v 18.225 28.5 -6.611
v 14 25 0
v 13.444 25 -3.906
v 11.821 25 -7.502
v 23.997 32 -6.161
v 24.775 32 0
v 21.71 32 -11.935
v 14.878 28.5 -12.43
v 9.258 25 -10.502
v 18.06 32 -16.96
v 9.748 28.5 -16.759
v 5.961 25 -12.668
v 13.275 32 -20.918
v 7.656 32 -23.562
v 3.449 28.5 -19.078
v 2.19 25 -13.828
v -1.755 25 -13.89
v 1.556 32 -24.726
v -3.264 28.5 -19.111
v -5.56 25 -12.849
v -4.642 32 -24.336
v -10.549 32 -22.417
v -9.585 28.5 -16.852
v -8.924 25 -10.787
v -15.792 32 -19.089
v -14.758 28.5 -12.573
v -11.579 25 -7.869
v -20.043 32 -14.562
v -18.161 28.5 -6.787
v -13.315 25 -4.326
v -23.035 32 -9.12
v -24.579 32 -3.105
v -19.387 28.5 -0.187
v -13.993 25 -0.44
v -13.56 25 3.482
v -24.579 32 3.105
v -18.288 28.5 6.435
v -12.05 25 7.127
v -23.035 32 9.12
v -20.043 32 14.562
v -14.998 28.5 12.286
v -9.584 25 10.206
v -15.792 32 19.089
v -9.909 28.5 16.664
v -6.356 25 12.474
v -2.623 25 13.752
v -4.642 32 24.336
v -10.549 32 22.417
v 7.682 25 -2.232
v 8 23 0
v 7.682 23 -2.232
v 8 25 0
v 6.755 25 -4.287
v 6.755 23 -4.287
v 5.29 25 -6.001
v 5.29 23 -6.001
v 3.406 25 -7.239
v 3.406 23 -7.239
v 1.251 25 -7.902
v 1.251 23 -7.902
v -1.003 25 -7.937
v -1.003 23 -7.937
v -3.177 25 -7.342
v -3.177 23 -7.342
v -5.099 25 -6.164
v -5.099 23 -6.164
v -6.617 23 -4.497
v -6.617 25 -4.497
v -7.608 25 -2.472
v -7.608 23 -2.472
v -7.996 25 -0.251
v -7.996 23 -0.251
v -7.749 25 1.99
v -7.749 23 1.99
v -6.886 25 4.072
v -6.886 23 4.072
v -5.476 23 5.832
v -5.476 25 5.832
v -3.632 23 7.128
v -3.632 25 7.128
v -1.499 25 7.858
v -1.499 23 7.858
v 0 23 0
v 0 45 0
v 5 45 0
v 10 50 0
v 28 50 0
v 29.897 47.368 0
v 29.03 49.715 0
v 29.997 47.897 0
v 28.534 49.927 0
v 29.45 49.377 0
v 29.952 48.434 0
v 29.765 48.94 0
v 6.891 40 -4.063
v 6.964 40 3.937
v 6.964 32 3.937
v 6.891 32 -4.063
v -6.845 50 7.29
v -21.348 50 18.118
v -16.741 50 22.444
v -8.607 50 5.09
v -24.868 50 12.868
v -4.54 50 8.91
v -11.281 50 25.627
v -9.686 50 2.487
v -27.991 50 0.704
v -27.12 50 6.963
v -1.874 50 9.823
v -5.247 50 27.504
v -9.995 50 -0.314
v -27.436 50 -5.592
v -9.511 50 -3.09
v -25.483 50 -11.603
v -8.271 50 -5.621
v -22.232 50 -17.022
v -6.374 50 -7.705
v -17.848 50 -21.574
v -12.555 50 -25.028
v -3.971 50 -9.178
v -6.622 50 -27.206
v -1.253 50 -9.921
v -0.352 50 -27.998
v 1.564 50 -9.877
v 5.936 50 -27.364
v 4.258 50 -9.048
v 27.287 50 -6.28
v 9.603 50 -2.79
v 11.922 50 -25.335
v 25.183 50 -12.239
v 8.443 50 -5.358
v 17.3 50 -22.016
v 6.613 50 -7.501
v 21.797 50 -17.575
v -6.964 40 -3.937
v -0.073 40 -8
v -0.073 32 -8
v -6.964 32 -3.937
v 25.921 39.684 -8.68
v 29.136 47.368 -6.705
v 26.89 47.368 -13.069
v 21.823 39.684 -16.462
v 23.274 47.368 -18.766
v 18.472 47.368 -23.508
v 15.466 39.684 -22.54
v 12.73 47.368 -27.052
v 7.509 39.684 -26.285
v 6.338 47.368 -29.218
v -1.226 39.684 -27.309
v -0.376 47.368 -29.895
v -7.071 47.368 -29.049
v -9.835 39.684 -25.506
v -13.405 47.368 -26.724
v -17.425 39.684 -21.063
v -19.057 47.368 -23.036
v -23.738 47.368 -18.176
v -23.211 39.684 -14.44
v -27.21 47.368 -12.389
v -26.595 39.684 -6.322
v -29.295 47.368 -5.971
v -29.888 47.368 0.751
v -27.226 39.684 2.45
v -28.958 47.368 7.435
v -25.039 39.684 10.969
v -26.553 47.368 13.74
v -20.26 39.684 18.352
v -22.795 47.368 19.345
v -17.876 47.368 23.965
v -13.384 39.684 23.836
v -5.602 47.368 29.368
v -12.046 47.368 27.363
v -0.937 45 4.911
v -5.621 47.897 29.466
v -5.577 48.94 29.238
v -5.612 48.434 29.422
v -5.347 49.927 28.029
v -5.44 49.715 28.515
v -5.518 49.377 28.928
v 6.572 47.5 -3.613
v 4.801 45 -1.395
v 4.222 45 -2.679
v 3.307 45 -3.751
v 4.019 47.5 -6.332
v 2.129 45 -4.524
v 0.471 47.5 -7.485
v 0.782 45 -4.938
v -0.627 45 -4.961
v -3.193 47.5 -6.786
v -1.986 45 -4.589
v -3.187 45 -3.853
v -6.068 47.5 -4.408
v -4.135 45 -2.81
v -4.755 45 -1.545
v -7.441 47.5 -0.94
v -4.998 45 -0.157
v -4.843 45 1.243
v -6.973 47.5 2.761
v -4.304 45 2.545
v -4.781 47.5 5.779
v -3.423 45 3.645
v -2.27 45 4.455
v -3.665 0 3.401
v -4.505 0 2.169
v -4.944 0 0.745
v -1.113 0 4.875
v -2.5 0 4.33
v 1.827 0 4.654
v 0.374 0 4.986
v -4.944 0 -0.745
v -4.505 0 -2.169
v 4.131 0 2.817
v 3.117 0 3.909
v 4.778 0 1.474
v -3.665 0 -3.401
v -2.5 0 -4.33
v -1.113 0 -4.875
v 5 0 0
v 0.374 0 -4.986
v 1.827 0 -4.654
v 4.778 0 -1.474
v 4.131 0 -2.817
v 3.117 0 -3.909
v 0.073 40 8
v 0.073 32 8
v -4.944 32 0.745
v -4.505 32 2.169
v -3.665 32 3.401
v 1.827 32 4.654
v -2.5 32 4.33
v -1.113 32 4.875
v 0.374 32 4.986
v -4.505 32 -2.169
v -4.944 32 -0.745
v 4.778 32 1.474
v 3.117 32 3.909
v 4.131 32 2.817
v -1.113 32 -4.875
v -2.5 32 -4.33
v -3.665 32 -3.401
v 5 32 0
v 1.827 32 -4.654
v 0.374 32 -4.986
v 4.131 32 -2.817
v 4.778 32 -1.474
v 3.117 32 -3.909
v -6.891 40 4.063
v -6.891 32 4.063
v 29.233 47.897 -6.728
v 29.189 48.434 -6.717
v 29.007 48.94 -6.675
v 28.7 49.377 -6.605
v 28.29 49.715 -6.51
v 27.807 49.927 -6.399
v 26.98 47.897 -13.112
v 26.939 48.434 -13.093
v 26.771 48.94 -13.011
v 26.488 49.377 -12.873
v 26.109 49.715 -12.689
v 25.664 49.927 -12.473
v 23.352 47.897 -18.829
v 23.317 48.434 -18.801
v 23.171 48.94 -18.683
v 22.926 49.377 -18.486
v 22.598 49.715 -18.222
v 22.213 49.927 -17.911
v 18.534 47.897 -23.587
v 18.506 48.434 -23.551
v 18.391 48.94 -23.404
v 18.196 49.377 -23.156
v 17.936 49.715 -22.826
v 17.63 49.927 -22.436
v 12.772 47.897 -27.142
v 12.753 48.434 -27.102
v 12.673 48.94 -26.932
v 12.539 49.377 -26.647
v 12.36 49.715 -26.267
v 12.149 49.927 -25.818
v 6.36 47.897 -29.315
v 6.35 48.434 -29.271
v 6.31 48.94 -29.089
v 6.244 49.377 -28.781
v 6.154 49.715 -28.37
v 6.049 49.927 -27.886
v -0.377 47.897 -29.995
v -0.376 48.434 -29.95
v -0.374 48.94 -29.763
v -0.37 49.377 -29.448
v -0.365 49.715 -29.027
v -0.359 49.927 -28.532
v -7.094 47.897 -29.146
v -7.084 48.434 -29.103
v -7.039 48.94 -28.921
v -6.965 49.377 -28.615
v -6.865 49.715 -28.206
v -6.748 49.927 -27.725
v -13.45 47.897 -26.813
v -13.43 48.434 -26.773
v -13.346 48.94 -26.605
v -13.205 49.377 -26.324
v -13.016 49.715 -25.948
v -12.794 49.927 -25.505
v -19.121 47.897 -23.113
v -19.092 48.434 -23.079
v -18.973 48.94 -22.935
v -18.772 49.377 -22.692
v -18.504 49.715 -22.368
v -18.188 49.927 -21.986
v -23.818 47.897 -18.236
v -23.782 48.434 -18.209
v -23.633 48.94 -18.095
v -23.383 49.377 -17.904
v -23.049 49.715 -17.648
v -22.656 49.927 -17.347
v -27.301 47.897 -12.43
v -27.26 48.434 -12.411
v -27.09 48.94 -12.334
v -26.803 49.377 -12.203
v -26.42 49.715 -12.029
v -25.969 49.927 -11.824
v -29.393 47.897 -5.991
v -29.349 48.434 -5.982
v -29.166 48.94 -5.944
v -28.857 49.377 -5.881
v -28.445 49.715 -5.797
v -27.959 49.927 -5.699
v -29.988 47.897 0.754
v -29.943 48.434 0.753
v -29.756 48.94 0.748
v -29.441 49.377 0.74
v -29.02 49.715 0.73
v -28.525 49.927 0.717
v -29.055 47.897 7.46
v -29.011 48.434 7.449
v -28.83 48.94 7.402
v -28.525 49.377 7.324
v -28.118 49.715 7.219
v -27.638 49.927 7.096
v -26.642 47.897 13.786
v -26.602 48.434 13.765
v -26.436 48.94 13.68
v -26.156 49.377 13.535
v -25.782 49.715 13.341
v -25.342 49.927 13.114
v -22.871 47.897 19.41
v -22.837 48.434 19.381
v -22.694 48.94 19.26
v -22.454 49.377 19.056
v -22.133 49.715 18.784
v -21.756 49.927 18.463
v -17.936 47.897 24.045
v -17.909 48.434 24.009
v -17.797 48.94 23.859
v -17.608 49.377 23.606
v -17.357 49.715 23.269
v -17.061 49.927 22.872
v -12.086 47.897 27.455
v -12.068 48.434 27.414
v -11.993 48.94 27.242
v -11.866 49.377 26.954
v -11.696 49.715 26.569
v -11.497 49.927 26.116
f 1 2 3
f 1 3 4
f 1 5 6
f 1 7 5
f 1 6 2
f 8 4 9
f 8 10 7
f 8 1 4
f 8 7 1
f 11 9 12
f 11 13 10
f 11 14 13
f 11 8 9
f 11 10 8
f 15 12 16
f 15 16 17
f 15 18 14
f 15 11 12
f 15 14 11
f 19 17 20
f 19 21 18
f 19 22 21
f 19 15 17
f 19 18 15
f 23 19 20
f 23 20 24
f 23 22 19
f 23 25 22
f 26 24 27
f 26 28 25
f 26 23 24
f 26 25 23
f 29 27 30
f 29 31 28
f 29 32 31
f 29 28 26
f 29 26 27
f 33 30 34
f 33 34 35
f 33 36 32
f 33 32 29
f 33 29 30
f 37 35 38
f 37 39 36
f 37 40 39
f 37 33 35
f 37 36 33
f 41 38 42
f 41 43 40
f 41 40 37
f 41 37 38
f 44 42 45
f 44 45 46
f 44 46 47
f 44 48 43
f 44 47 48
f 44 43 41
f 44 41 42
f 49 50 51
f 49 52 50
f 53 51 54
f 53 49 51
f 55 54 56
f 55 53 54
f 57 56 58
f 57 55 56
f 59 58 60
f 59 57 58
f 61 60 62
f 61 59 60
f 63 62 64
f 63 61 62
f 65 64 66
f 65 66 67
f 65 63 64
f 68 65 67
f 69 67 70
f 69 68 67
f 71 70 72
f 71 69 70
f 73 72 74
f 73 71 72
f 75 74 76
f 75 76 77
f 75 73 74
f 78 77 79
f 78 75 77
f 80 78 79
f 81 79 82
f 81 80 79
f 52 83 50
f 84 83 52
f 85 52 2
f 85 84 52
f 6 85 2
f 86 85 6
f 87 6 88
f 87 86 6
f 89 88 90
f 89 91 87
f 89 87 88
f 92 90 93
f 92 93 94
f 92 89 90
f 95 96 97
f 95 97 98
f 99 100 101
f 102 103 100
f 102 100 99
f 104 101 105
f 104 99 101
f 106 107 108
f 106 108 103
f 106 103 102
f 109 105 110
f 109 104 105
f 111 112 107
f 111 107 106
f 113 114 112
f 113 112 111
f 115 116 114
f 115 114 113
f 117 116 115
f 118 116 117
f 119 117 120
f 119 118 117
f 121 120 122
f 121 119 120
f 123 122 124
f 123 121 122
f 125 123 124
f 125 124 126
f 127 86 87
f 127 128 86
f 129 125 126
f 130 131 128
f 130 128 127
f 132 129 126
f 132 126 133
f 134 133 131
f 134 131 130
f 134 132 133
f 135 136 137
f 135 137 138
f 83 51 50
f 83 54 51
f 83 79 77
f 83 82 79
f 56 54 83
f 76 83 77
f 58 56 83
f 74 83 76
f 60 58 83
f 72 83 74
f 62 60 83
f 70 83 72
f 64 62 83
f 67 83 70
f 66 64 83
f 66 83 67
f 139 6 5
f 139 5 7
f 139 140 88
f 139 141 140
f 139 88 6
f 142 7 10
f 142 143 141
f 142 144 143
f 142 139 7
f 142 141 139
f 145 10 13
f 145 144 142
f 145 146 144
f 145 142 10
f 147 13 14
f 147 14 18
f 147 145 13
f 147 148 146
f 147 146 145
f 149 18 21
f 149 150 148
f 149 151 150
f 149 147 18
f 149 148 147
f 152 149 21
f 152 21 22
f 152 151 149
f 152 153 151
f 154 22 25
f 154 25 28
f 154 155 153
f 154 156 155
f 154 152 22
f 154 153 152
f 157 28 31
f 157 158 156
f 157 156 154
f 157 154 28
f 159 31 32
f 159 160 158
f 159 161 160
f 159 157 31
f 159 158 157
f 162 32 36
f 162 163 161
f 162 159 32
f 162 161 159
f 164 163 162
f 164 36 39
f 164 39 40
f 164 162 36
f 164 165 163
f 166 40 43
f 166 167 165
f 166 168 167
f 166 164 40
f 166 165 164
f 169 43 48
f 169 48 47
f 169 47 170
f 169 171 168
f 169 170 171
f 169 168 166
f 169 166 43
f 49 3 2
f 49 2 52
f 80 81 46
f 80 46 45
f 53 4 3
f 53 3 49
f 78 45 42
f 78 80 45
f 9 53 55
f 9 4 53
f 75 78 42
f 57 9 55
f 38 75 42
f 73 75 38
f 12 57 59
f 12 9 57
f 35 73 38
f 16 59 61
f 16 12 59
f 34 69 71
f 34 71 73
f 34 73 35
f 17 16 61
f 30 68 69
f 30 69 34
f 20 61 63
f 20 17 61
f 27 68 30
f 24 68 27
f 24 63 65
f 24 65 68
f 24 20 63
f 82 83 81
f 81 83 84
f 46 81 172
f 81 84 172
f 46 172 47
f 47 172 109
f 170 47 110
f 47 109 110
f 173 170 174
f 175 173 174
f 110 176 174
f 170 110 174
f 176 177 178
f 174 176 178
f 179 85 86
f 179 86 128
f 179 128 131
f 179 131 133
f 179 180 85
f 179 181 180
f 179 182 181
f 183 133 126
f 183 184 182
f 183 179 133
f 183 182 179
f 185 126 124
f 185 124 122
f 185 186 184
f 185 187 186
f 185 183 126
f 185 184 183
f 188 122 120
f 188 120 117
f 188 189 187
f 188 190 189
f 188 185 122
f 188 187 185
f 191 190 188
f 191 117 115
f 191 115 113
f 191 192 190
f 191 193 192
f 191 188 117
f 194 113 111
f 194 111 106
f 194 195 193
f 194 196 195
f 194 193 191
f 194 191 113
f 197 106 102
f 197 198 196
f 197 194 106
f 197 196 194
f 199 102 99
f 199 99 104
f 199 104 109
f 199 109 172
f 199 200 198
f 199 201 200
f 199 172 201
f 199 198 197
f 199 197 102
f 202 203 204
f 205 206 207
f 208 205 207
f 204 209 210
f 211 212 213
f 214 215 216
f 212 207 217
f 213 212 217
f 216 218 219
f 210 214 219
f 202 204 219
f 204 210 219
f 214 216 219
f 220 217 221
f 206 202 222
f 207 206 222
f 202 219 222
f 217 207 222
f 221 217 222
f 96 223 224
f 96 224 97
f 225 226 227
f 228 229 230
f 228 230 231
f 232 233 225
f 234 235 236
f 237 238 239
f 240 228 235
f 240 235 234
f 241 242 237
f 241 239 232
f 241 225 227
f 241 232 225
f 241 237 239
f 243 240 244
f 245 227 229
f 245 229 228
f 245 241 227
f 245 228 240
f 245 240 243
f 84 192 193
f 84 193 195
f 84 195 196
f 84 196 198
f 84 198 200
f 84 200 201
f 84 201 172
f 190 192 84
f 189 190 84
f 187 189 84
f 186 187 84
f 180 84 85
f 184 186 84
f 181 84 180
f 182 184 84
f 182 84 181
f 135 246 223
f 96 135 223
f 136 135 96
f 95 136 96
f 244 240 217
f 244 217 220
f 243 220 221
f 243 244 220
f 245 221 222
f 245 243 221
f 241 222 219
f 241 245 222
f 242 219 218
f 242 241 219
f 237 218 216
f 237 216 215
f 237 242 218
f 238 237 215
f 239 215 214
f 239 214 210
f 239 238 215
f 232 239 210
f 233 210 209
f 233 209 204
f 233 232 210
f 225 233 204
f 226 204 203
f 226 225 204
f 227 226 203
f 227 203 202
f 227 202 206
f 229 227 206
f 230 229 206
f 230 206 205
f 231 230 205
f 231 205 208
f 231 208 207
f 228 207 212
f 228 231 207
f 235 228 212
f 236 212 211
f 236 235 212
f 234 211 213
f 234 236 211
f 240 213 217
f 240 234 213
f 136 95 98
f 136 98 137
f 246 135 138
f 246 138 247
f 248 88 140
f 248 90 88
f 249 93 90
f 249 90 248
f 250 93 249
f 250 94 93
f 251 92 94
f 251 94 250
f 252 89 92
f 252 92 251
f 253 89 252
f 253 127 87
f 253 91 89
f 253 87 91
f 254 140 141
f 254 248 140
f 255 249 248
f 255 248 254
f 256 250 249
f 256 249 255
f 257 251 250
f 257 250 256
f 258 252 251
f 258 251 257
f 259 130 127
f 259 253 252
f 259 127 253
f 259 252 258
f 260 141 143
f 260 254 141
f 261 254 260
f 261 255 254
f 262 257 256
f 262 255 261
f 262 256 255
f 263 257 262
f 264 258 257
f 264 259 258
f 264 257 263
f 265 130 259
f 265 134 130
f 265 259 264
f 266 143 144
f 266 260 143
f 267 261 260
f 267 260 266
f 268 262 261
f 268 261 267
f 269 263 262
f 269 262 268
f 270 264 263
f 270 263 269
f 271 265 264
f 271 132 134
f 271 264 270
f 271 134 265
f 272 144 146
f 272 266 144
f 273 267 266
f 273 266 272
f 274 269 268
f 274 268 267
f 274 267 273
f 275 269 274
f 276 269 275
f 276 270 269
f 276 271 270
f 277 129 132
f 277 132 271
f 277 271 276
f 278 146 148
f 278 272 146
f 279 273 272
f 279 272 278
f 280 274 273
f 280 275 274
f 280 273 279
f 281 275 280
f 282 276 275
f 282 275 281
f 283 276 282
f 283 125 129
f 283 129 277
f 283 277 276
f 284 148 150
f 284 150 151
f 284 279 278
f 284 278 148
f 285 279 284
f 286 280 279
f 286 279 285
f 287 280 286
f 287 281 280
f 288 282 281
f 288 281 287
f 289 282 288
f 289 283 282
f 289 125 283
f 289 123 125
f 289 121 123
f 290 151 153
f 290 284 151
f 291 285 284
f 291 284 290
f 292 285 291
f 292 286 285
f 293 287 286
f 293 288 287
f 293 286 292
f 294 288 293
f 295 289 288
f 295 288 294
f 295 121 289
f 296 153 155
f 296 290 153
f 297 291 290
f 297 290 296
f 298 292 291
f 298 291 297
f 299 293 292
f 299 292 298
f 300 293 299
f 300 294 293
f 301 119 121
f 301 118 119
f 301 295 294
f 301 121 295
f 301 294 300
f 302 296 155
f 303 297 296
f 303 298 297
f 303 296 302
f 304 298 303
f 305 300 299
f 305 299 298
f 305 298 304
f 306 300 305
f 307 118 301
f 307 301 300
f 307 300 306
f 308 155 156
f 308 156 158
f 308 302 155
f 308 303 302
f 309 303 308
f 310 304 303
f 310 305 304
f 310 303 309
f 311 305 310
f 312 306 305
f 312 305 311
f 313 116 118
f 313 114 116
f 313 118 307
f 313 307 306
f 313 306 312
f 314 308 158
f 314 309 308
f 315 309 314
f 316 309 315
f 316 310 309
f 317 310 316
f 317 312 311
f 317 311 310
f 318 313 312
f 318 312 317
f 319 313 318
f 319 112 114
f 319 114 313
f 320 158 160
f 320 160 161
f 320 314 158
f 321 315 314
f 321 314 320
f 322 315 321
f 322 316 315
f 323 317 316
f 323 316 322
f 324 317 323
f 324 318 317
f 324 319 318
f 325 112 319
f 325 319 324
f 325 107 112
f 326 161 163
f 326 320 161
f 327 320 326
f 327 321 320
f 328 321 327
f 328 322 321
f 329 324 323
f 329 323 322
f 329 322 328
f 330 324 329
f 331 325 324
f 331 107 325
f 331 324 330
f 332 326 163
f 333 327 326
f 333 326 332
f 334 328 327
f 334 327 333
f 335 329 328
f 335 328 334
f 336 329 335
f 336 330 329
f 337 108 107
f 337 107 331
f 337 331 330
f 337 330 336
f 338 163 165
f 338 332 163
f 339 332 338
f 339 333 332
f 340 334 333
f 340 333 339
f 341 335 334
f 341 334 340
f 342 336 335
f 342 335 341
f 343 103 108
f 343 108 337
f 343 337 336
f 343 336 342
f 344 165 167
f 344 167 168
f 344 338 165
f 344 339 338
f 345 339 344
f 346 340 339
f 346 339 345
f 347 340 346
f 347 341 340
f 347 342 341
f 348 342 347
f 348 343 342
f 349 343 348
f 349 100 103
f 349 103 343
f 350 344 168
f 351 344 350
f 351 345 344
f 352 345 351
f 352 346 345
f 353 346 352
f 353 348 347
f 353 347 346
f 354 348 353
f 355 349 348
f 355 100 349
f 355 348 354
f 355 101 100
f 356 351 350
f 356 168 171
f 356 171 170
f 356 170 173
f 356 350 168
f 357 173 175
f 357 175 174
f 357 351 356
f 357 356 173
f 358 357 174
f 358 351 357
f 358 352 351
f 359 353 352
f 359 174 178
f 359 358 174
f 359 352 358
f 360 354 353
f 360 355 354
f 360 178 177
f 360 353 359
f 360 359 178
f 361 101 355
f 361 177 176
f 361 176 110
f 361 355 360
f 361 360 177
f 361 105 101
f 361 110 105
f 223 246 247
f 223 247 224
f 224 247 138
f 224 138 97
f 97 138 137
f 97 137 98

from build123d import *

# Parameters (mm, degrees)
REVOLVE_2_ANGLE = 259.2
SKETCH_5_R      = 10
SKETCH_6_R      = 5
EXTRUDE_1_DEPTH = 8
SKETCH_8_R      = 5
EXTRUDE_2_DEPTH = 32


with BuildPart() as part:
    # Эскиз4 → Повернуть2 (revolve)
    with BuildSketch(Plane.XY):
        with BuildLine():
            Line((0, 23), (8, 23))
            Line((8, 23), (8, 25))
            Line((8, 25), (14, 25))
            Line((14, 25), (24.774851773, 32))
            Line((24.774851773, 32), (29.897366596, 47.367544468))
            ThreePointArc((29.897366596, 47.367544468), (29.62248437, 49.169420569), (28, 50))
            Line((28, 50), (0, 50))
            Line((0, 50), (0, 23))
        make_face()
    revolve(axis=Axis((0, 0, 0), (0, 1, 0)), revolution_arc=REVOLVE_2_ANGLE)

    # Эскиз5 → Вырез-По сечениям1 section 0
    with BuildSketch(Plane(origin=(0, 50, 0), x_dir=(1, 0, 0), z_dir=(0, 1, 0))):
        Circle(SKETCH_5_R)
    # Эскиз6 → Вырез-По сечениям1 section 1
    with BuildSketch(Plane(origin=(0, 45, 0), x_dir=(1, 0, 0), z_dir=(0, 1, 0))):
        Circle(SKETCH_6_R)
    loft(mode=Mode.SUBTRACT)


with BuildPart() as body_2:
    # Эскиз7 → Бобышка-Вытянуть1 (new body)
    with BuildSketch(Plane(origin=(0, 40, 0), x_dir=(1, 0, 0), z_dir=(0, 1, 0))):
        Polygon((-0.073107163, 7.999665952), (-6.964467518, 3.936520315), (-6.891360355, -4.063145636), (0.073107163, -7.999665952), (6.964467518, -3.936520315), (6.891360355, 4.063145636), align=None)
    extrude(amount=-EXTRUDE_1_DEPTH)


with BuildPart() as body_3:
    # Эскиз8 → Бобышка-Вытянуть2 (new body)
    with BuildSketch(Plane(origin=(0, 32, 0), x_dir=(1, 0, 0), z_dir=(0, 1, 0))):
        Circle(SKETCH_8_R)
    extrude(amount=-EXTRUDE_2_DEPTH)


solid = Compound([part.part, body_2.part, body_3.part])
